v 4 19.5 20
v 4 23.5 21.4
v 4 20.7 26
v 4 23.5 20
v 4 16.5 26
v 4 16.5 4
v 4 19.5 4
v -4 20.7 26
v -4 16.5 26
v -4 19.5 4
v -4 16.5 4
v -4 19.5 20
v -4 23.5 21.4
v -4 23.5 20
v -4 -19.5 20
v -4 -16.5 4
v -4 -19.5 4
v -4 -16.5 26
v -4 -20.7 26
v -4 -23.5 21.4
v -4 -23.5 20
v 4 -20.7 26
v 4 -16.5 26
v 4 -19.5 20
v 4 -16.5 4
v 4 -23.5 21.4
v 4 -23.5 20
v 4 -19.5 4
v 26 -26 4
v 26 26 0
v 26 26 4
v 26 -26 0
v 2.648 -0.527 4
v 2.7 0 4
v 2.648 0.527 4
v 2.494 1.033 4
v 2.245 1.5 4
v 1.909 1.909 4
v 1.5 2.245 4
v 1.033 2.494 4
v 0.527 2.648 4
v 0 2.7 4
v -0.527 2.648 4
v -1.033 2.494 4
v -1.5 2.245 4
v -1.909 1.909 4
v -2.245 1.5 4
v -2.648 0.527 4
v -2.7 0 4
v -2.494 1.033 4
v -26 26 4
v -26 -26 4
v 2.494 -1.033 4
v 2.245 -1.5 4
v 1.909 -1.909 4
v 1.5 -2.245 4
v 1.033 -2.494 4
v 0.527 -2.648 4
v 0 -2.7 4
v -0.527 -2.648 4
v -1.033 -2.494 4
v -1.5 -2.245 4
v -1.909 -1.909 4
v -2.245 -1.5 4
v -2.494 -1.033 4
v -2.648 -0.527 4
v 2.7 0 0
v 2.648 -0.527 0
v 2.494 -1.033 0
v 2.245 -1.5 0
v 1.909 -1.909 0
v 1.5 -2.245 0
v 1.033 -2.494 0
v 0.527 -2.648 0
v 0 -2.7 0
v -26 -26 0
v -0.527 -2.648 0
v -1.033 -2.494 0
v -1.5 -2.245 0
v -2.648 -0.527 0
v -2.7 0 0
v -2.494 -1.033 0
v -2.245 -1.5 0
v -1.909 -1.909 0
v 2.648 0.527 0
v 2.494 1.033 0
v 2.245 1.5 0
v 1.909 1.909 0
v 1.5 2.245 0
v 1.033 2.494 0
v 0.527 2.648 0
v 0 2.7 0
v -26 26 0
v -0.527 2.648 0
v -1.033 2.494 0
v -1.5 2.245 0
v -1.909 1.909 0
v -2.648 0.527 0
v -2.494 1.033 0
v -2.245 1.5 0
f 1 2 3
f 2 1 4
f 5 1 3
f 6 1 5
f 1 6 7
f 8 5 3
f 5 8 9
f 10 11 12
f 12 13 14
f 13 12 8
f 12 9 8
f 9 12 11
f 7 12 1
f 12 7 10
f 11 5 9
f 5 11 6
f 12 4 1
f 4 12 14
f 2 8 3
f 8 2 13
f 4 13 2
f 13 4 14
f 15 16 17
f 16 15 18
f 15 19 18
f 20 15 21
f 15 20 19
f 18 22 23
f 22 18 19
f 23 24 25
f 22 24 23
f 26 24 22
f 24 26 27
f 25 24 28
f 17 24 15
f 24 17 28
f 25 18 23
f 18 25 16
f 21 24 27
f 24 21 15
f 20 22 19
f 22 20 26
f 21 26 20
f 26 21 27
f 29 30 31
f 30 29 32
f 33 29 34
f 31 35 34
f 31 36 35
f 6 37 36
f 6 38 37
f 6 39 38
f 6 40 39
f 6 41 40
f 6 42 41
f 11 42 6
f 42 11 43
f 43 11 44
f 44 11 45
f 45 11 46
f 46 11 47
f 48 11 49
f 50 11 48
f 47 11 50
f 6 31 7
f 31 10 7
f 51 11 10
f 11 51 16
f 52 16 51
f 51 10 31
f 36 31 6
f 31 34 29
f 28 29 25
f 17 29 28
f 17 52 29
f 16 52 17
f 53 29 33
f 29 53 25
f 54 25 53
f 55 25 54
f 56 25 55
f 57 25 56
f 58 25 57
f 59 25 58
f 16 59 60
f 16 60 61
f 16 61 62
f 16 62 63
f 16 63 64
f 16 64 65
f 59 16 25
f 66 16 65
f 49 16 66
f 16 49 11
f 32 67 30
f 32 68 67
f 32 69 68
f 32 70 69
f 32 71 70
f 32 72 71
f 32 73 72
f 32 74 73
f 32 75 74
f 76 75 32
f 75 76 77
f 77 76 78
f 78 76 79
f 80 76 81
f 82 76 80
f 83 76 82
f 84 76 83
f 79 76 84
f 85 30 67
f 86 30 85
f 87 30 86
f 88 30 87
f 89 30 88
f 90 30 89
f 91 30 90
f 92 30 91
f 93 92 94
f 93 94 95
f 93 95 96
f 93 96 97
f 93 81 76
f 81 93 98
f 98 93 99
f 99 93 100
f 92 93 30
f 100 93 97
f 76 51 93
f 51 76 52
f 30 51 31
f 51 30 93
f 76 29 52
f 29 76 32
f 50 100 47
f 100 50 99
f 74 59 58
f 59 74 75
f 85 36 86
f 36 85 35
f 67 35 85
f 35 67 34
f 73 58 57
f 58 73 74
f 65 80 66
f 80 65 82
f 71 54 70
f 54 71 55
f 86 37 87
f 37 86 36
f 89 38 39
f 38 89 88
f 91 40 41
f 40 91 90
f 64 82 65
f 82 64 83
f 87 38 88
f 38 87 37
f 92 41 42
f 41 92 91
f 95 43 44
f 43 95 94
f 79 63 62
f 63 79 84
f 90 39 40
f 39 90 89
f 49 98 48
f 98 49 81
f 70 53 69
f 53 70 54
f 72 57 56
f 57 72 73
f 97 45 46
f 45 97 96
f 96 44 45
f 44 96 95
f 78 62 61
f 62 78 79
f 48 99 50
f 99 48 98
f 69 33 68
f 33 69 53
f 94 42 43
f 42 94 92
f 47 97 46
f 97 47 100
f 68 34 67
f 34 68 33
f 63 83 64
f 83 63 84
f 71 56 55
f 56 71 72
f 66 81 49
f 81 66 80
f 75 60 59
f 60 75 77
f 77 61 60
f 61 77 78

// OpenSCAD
$fn = 32;

// ----------------------------------------------------------------------
// Snap-fit latch: 2 arms, 22 mm tall, 4.2 mm undercut hooks
// ----------------------------------------------------------------------

// --- parameters (mm) ---
base_d = 52;              // base plate depth
base_h = 4;               // base plate thickness
span = 36;                // distance between opposite arms
arm_t = 3;                // arm thickness
arm_d = 8;                // arm width
height = 22;              // free arm length
head_len = 4.2;           // hook reach
head_h = 6;               // hook height
lead = 1.4;               // lead-in ramp thickness
bore_d = 5.4;             // base fixing bore
top_z = 26;               // height of the arm tips above the base

arms = 2;

difference() {
  union() {
    /* base plate, centred on the arm ring */
    translate([-26, -26, 0]) cube([base_d, base_d, base_h]);
    for (a = [0 : 360 / arms : 359]) rotate([0, 0, a]) {
    /* arm, sunk 0.5 mm into the base */
    translate([-arm_d / 2, span / 2 - arm_t / 2, base_h - 0.5]) cube([arm_d, arm_t, height + 0.5]);
    /* hook: a convex hull of a tall inner block and a thin outer lip
       gives a flat undercut below and a lead-in ramp on top */
    hull() {
      translate([-arm_d / 2, span / 2 + arm_t / 2 - 0.6, top_z - head_h]) cube([arm_d, lead + 0.4, head_h]);
      translate([-arm_d / 2, span / 2 + arm_t / 2 - 0.2, top_z - head_h]) cube([arm_d, head_len, lead]);
    }
    }
  }
  translate([0, 0, -2.5]) cylinder(h = base_h + 5, d = bore_d);
}
